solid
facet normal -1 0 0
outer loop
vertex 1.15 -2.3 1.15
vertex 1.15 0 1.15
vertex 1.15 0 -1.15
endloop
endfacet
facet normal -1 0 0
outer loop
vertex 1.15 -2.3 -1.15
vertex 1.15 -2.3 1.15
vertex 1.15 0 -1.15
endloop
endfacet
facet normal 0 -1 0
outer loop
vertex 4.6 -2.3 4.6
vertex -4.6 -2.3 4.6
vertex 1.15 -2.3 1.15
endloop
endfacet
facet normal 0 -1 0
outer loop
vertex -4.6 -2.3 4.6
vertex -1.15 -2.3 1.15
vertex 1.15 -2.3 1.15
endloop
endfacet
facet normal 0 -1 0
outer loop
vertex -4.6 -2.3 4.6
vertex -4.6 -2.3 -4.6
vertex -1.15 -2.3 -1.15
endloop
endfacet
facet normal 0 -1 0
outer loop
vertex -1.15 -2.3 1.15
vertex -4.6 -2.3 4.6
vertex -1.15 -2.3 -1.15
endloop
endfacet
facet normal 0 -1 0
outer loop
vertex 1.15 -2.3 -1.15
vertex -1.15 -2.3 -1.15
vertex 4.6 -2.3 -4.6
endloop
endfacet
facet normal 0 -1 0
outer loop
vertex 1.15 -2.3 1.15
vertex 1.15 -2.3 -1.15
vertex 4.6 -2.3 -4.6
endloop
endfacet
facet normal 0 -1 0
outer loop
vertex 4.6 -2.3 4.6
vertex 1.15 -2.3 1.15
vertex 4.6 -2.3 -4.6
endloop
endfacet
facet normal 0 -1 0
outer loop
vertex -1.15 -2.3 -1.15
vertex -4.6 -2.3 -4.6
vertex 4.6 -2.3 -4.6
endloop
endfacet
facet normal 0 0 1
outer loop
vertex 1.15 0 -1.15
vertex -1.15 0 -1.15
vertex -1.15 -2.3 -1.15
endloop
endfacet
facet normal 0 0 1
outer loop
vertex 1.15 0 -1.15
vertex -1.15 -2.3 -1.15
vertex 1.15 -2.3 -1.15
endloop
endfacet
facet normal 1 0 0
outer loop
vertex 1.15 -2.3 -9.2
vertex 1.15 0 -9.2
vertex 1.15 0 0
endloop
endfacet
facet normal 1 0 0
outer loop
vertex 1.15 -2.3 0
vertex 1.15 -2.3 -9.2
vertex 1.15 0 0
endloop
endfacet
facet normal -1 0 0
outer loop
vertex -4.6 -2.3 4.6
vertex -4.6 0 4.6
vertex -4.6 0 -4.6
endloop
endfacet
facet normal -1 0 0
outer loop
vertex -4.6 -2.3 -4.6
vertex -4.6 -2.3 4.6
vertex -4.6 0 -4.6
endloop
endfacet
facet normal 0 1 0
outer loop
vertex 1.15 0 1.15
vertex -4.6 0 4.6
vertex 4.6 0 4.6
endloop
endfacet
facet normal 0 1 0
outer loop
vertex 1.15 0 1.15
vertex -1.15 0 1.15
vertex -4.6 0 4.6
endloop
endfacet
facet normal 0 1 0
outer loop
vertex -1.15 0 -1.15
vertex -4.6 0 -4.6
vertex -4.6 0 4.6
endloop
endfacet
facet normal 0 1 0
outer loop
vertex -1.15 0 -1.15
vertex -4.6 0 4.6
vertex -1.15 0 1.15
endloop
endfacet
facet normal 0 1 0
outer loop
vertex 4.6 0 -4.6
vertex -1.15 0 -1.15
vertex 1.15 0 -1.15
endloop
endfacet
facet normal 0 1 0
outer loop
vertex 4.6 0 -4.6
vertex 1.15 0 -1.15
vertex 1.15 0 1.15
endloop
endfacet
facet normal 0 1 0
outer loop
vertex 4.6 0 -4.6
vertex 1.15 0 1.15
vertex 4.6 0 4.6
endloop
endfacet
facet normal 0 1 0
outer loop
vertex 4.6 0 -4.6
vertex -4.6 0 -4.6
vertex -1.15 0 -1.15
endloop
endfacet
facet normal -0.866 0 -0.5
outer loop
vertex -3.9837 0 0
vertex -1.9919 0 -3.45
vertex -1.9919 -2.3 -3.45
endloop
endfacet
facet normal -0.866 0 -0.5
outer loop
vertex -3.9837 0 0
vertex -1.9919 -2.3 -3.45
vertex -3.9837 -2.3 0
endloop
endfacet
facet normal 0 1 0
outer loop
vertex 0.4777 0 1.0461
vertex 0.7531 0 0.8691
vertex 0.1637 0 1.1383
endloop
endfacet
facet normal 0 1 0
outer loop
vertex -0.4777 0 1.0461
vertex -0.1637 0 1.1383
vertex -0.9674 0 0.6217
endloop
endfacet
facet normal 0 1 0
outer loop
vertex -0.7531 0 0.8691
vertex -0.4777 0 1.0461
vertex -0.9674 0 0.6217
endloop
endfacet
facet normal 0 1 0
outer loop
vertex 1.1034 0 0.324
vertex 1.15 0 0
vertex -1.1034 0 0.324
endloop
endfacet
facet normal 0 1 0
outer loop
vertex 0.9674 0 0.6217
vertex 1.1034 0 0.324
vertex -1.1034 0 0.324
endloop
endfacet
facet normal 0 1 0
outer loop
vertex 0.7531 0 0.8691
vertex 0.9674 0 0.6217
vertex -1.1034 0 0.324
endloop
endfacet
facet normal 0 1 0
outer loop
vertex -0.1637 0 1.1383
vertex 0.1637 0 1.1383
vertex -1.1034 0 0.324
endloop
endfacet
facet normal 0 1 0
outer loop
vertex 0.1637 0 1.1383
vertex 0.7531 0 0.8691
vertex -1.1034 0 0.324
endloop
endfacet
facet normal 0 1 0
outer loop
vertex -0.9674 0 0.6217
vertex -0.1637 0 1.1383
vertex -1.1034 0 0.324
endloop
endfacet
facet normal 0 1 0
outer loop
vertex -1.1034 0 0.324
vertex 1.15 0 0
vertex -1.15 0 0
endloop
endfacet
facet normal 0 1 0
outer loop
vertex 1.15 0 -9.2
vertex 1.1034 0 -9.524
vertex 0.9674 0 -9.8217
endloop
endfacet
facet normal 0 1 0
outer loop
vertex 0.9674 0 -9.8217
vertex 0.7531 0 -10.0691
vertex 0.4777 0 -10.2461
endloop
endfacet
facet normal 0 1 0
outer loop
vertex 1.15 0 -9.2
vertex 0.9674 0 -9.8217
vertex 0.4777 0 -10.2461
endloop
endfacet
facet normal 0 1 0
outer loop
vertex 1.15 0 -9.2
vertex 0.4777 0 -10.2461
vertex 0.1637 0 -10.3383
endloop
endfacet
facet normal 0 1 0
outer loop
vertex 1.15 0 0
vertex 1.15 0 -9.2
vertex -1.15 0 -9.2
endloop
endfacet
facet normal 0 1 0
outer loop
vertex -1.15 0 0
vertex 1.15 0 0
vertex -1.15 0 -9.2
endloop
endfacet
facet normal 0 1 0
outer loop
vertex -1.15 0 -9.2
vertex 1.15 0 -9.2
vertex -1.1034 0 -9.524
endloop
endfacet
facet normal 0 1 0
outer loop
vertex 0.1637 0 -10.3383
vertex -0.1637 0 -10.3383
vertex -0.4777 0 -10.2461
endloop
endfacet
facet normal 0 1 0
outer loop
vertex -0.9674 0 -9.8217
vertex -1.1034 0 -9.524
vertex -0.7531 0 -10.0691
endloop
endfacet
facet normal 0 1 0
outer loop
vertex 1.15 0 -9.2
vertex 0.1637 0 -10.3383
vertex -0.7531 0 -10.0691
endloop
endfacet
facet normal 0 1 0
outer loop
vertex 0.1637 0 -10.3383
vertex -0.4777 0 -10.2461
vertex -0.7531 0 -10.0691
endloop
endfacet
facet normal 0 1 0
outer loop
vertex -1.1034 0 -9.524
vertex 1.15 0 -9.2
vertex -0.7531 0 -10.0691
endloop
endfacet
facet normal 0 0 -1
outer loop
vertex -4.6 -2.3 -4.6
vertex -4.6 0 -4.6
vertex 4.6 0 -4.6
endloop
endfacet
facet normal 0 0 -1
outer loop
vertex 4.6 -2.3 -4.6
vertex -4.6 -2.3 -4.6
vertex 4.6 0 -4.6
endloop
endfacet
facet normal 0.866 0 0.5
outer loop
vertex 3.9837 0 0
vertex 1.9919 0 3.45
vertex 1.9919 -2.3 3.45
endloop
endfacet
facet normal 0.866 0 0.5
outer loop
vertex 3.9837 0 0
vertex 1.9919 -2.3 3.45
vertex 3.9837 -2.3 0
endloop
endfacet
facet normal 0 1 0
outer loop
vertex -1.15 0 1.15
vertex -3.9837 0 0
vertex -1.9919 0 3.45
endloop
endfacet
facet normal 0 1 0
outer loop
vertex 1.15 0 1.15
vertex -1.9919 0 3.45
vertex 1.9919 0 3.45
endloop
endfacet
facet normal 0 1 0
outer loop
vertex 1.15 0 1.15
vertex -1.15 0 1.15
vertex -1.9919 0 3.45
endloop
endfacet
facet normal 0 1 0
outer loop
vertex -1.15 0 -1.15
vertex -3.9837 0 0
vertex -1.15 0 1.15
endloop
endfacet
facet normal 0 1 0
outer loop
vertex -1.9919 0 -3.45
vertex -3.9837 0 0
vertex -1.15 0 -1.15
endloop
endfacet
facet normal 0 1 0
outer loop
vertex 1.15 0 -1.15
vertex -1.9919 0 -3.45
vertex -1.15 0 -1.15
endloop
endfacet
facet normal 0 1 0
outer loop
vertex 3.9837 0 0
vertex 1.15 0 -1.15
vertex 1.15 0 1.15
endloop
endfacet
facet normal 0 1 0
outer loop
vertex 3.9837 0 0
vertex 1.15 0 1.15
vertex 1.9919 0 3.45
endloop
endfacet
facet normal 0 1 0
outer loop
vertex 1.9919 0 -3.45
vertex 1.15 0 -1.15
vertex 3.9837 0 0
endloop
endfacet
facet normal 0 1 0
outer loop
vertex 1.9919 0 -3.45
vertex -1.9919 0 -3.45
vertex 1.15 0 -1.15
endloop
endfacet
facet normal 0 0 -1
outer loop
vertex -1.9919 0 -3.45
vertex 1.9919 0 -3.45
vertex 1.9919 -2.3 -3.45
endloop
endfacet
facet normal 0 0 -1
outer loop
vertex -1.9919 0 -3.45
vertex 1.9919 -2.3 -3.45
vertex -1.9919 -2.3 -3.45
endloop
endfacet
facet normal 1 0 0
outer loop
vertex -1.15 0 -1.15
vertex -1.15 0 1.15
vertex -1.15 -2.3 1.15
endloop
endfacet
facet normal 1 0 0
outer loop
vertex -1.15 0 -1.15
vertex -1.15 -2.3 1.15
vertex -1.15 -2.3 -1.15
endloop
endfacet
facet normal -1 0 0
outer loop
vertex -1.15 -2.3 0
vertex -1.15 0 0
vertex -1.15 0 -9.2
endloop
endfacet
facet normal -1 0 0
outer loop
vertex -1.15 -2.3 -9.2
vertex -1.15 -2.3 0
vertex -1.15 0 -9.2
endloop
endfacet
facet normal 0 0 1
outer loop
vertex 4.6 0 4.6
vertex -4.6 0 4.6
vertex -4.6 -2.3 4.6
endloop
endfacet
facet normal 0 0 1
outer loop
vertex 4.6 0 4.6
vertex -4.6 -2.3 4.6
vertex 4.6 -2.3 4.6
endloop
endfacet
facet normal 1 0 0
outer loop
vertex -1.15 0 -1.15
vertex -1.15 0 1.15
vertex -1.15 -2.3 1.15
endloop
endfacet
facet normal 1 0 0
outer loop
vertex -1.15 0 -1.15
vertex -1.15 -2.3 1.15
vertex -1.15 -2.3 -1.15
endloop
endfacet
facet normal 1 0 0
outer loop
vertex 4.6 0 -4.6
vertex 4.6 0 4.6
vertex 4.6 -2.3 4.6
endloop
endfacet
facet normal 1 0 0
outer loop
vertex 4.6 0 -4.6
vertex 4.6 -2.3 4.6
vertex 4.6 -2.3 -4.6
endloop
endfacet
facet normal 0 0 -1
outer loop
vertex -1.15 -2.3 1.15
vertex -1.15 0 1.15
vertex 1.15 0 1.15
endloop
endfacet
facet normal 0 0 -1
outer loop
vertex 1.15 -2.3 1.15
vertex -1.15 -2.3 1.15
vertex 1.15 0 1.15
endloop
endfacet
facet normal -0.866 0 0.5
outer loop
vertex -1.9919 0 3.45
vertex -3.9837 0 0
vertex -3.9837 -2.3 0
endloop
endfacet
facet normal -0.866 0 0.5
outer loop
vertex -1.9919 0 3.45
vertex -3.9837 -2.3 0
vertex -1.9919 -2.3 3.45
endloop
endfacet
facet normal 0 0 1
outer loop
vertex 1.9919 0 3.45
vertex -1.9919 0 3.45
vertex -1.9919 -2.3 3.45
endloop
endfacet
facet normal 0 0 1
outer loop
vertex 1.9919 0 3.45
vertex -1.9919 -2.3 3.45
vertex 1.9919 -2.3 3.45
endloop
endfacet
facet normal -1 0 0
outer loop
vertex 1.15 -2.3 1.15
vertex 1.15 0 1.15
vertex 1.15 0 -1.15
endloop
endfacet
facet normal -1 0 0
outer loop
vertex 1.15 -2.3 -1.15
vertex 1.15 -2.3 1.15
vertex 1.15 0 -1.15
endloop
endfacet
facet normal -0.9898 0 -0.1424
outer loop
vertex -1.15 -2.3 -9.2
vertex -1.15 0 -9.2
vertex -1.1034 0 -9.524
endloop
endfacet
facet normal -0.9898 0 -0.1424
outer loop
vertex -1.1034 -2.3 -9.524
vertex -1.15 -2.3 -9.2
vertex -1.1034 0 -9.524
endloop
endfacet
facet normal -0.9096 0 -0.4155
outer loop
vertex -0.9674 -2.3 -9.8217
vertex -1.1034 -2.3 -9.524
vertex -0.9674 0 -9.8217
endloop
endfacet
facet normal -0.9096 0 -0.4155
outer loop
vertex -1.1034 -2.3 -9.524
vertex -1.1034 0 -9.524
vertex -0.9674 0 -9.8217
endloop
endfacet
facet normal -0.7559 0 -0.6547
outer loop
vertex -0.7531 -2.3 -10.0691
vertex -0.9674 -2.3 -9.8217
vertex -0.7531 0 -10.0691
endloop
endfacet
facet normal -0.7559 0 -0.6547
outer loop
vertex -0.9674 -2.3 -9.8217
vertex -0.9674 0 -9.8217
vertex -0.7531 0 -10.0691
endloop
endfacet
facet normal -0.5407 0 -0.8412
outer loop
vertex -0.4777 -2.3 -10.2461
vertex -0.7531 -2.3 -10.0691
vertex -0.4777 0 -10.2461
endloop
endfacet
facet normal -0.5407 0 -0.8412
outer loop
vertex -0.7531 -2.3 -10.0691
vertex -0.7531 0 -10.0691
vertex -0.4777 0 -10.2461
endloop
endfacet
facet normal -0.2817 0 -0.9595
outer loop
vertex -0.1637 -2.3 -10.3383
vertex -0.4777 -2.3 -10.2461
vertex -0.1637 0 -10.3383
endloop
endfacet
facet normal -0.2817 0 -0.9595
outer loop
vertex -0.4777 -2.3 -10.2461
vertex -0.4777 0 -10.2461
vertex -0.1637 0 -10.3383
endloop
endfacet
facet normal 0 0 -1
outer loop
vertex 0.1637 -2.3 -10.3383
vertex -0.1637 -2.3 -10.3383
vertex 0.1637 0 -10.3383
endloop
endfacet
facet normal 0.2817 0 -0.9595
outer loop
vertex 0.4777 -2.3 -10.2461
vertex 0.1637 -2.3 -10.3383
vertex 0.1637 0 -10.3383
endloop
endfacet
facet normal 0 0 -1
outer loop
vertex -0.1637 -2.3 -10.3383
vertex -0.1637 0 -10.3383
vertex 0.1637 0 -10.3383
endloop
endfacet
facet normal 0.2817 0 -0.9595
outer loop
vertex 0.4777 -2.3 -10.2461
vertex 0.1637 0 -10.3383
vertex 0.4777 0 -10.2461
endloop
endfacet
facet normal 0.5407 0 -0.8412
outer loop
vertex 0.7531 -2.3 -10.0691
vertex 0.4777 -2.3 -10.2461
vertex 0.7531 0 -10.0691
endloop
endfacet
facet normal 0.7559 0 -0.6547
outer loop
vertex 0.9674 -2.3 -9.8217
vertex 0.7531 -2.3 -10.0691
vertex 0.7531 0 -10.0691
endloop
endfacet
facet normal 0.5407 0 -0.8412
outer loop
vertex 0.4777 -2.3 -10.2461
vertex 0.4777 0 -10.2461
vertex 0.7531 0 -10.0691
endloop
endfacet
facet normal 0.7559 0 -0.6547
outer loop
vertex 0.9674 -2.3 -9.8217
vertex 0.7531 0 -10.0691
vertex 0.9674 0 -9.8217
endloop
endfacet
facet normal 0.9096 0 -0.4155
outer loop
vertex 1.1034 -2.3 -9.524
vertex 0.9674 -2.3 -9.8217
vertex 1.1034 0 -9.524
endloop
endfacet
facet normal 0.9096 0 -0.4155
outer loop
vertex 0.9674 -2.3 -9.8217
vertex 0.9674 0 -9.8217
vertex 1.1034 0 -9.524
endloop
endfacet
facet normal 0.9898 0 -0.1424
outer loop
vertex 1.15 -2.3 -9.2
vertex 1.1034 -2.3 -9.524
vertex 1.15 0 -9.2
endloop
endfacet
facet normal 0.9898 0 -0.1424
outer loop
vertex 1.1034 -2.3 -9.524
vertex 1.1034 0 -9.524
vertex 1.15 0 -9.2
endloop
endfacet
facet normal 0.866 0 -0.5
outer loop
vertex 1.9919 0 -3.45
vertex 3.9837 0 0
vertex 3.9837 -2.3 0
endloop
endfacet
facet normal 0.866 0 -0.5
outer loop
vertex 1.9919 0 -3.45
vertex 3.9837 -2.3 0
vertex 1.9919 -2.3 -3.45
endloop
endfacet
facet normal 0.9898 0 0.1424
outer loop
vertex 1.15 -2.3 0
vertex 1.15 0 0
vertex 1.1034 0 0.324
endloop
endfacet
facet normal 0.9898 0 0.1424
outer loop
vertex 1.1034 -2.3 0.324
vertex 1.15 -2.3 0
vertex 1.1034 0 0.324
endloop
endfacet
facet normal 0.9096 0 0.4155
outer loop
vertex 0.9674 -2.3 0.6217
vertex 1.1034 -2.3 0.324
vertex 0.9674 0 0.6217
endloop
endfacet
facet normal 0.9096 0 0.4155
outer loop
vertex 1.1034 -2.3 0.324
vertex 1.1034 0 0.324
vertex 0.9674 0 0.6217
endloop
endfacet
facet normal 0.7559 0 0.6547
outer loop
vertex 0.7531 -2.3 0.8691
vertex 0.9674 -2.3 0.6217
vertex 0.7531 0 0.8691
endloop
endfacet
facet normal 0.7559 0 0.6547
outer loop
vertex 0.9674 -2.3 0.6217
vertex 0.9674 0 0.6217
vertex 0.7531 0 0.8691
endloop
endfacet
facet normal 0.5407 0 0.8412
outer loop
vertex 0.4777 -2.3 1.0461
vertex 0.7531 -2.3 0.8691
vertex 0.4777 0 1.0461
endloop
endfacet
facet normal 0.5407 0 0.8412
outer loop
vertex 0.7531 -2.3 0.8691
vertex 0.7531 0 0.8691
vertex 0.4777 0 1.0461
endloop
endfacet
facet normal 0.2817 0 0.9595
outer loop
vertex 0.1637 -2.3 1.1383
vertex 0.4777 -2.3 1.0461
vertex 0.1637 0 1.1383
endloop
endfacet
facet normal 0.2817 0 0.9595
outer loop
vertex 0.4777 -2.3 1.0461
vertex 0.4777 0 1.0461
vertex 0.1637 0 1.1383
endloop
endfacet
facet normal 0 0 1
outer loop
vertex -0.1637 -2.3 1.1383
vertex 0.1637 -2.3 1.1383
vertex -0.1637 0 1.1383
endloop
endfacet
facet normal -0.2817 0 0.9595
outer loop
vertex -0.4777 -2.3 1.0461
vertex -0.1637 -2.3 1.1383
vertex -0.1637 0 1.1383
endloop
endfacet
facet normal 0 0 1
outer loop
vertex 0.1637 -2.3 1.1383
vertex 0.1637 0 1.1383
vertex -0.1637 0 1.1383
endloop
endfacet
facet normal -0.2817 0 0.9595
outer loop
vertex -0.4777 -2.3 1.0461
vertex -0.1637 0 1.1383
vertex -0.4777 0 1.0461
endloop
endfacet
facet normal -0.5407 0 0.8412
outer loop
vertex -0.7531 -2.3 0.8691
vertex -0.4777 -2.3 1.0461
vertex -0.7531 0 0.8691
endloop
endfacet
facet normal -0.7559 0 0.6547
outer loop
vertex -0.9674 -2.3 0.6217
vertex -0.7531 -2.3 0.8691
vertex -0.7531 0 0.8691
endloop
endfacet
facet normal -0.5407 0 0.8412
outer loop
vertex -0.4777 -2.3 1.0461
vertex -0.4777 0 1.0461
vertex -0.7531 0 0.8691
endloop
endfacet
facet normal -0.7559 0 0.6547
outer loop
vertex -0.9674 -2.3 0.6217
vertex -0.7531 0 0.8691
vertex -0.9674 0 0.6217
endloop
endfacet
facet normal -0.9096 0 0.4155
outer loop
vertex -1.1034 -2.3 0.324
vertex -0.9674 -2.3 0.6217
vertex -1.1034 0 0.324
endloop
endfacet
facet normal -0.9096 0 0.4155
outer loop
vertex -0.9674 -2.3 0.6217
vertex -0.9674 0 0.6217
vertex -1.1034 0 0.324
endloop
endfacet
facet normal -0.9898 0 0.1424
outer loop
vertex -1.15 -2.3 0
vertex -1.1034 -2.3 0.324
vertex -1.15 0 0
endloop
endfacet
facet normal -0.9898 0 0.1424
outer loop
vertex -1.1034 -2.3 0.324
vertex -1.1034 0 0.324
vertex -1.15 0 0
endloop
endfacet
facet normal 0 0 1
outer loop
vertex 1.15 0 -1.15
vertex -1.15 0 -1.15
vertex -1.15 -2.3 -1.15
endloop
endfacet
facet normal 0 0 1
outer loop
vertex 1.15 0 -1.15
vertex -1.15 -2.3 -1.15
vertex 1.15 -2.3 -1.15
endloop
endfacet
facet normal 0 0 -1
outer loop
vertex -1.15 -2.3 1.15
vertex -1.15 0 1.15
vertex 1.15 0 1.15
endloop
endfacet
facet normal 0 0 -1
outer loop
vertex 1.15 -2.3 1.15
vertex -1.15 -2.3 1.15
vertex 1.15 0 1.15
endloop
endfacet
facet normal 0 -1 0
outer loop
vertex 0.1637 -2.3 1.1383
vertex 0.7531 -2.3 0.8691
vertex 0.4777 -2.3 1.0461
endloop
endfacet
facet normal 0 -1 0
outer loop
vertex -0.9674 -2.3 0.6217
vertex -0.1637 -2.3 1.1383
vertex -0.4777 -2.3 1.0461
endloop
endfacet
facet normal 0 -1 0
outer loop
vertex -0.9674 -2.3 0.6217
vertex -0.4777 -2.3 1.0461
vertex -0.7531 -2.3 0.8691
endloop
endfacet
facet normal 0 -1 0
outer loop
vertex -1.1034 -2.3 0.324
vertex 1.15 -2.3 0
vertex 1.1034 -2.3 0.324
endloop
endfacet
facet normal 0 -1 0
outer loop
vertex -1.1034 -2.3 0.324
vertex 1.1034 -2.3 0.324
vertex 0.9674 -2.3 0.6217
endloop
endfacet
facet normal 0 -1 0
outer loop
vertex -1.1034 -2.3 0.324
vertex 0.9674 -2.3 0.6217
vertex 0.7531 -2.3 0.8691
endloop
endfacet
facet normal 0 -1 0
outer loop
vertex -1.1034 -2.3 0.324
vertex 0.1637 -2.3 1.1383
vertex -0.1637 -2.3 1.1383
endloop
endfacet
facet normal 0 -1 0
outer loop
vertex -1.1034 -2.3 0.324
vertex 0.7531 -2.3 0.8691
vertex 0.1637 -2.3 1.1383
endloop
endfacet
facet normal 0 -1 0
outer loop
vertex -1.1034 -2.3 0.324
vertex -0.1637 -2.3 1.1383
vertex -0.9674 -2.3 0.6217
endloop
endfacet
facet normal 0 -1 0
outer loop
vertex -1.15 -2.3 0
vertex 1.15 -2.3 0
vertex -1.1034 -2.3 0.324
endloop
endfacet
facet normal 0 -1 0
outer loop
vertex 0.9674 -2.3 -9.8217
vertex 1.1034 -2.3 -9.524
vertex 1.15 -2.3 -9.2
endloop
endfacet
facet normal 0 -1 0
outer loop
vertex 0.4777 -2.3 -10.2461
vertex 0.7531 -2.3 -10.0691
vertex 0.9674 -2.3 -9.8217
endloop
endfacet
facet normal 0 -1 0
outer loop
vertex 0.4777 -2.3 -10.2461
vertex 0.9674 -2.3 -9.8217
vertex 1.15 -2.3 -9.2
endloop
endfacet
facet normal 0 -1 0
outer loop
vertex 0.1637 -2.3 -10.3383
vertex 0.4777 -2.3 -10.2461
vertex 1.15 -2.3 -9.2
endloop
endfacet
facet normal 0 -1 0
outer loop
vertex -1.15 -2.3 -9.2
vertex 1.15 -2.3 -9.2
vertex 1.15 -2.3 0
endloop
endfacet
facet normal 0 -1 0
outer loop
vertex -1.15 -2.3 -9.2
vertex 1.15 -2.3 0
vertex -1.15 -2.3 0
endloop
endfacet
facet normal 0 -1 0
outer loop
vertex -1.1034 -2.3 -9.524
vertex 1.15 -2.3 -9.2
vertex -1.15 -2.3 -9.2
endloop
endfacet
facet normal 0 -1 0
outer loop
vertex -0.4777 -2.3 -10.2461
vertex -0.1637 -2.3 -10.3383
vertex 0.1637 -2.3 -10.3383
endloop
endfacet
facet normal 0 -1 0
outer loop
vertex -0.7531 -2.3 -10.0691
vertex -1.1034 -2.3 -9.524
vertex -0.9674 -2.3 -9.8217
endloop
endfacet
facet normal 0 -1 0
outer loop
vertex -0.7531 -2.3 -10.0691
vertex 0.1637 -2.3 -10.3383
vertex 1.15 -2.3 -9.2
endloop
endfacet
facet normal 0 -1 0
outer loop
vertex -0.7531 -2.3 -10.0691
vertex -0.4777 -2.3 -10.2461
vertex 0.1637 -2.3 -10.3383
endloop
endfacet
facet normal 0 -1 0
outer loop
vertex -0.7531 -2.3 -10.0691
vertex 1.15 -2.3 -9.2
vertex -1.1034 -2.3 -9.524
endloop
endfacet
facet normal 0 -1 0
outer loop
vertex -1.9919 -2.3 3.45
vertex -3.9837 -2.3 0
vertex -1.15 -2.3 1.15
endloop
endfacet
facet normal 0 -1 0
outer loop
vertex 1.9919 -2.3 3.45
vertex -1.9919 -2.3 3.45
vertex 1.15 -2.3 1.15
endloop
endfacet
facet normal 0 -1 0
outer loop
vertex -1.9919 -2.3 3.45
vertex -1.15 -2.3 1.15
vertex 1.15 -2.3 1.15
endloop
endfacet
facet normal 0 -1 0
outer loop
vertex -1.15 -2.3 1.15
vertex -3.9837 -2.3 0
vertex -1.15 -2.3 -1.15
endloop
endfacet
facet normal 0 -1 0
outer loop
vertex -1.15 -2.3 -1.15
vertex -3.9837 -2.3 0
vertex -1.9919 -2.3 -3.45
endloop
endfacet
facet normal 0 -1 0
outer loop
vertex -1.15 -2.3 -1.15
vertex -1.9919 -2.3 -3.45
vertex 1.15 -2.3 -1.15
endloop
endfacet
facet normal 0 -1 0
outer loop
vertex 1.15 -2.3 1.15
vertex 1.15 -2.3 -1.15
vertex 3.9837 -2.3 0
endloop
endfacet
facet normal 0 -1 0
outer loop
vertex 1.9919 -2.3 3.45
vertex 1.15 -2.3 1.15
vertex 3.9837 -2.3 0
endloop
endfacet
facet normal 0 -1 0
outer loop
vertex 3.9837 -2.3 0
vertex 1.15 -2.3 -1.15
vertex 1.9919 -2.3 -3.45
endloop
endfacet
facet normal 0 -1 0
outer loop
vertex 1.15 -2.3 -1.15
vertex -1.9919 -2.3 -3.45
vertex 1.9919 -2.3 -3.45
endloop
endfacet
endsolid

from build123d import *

# Parameters (mm, degrees)
BASE_FLANGE1_DEPTH = 2.3
SKETCH6_W          = 9.2
SKETCH6_H          = 9.2
BASE_FLANGE2_DEPTH = 2.3
SKETCH9_W          = 2.3
SKETCH9_H          = 2.3
CUT_EXTRUDE1_DEPTH = 2.3
BASE_FLANGE3_DEPTH = 2.3
SKETCH13_W         = 2.3
SKETCH13_H         = 2.3
CUT_EXTRUDE2_DEPTH = 12.557356964


# Sheet-metal steps are written as plain solids
with BuildPart() as part:
    # Sketch1 → Base-Flange1 (new body)
    with BuildSketch(Plane(origin=(0, 0, 0), x_dir=(1, 0, 0), z_dir=(0, 1, 0))):
        with BuildLine():
            Line((-1.15, 0), (-1.15, 9.2))
            ThreePointArc((-1.15, 9.2), (0, 10.35), (1.15, 9.2))
            Line((1.15, 9.2), (1.15, 0))
            ThreePointArc((1.15, 0), (0, -1.15), (-1.15, 0))
        make_face()
    extrude(amount=-BASE_FLANGE1_DEPTH)


with BuildPart() as body_2:
    # Sketch6 → Base-Flange2 (new body)
    with BuildSketch(Plane(origin=(0, 0, 0), x_dir=(1, 0, 0), z_dir=(0, 1, 0))):
        Rectangle(SKETCH6_W, SKETCH6_H)
    extrude(amount=-BASE_FLANGE2_DEPTH)

    # Sketch9 → Cut-Extrude1 (cut)
    with BuildSketch(Plane(origin=(0, 0, 0), x_dir=(1, 0, 0), z_dir=(0, 1, 0))):
        Rectangle(SKETCH9_W, SKETCH9_H)
    extrude(amount=-CUT_EXTRUDE1_DEPTH, mode=Mode.SUBTRACT)


with BuildPart() as body_3:
    # Sketch10 → Base-Flange3 (new body)
    with BuildSketch(Plane(origin=(0, 0, 0), x_dir=(1, 0, 0), z_dir=(0, 1, 0))):
        Polygon((3.983716857, 0), (1.991858429, 3.45), (-1.991858429, 3.45), (-3.983716857, 0), (-1.991858429, -3.45), (1.991858429, -3.45), align=None)
    extrude(amount=-BASE_FLANGE3_DEPTH)

    # Sketch13 → Cut-Extrude2 (cut, through all)
    with BuildSketch(Plane(origin=(0, 0, 0), x_dir=(1, 0, 0), z_dir=(0, 1, 0))):
        Rectangle(SKETCH13_W, SKETCH13_H)
    extrude(amount=-CUT_EXTRUDE2_DEPTH, mode=Mode.SUBTRACT)


solid = Compound([part.part, body_2.part, body_3.part])
